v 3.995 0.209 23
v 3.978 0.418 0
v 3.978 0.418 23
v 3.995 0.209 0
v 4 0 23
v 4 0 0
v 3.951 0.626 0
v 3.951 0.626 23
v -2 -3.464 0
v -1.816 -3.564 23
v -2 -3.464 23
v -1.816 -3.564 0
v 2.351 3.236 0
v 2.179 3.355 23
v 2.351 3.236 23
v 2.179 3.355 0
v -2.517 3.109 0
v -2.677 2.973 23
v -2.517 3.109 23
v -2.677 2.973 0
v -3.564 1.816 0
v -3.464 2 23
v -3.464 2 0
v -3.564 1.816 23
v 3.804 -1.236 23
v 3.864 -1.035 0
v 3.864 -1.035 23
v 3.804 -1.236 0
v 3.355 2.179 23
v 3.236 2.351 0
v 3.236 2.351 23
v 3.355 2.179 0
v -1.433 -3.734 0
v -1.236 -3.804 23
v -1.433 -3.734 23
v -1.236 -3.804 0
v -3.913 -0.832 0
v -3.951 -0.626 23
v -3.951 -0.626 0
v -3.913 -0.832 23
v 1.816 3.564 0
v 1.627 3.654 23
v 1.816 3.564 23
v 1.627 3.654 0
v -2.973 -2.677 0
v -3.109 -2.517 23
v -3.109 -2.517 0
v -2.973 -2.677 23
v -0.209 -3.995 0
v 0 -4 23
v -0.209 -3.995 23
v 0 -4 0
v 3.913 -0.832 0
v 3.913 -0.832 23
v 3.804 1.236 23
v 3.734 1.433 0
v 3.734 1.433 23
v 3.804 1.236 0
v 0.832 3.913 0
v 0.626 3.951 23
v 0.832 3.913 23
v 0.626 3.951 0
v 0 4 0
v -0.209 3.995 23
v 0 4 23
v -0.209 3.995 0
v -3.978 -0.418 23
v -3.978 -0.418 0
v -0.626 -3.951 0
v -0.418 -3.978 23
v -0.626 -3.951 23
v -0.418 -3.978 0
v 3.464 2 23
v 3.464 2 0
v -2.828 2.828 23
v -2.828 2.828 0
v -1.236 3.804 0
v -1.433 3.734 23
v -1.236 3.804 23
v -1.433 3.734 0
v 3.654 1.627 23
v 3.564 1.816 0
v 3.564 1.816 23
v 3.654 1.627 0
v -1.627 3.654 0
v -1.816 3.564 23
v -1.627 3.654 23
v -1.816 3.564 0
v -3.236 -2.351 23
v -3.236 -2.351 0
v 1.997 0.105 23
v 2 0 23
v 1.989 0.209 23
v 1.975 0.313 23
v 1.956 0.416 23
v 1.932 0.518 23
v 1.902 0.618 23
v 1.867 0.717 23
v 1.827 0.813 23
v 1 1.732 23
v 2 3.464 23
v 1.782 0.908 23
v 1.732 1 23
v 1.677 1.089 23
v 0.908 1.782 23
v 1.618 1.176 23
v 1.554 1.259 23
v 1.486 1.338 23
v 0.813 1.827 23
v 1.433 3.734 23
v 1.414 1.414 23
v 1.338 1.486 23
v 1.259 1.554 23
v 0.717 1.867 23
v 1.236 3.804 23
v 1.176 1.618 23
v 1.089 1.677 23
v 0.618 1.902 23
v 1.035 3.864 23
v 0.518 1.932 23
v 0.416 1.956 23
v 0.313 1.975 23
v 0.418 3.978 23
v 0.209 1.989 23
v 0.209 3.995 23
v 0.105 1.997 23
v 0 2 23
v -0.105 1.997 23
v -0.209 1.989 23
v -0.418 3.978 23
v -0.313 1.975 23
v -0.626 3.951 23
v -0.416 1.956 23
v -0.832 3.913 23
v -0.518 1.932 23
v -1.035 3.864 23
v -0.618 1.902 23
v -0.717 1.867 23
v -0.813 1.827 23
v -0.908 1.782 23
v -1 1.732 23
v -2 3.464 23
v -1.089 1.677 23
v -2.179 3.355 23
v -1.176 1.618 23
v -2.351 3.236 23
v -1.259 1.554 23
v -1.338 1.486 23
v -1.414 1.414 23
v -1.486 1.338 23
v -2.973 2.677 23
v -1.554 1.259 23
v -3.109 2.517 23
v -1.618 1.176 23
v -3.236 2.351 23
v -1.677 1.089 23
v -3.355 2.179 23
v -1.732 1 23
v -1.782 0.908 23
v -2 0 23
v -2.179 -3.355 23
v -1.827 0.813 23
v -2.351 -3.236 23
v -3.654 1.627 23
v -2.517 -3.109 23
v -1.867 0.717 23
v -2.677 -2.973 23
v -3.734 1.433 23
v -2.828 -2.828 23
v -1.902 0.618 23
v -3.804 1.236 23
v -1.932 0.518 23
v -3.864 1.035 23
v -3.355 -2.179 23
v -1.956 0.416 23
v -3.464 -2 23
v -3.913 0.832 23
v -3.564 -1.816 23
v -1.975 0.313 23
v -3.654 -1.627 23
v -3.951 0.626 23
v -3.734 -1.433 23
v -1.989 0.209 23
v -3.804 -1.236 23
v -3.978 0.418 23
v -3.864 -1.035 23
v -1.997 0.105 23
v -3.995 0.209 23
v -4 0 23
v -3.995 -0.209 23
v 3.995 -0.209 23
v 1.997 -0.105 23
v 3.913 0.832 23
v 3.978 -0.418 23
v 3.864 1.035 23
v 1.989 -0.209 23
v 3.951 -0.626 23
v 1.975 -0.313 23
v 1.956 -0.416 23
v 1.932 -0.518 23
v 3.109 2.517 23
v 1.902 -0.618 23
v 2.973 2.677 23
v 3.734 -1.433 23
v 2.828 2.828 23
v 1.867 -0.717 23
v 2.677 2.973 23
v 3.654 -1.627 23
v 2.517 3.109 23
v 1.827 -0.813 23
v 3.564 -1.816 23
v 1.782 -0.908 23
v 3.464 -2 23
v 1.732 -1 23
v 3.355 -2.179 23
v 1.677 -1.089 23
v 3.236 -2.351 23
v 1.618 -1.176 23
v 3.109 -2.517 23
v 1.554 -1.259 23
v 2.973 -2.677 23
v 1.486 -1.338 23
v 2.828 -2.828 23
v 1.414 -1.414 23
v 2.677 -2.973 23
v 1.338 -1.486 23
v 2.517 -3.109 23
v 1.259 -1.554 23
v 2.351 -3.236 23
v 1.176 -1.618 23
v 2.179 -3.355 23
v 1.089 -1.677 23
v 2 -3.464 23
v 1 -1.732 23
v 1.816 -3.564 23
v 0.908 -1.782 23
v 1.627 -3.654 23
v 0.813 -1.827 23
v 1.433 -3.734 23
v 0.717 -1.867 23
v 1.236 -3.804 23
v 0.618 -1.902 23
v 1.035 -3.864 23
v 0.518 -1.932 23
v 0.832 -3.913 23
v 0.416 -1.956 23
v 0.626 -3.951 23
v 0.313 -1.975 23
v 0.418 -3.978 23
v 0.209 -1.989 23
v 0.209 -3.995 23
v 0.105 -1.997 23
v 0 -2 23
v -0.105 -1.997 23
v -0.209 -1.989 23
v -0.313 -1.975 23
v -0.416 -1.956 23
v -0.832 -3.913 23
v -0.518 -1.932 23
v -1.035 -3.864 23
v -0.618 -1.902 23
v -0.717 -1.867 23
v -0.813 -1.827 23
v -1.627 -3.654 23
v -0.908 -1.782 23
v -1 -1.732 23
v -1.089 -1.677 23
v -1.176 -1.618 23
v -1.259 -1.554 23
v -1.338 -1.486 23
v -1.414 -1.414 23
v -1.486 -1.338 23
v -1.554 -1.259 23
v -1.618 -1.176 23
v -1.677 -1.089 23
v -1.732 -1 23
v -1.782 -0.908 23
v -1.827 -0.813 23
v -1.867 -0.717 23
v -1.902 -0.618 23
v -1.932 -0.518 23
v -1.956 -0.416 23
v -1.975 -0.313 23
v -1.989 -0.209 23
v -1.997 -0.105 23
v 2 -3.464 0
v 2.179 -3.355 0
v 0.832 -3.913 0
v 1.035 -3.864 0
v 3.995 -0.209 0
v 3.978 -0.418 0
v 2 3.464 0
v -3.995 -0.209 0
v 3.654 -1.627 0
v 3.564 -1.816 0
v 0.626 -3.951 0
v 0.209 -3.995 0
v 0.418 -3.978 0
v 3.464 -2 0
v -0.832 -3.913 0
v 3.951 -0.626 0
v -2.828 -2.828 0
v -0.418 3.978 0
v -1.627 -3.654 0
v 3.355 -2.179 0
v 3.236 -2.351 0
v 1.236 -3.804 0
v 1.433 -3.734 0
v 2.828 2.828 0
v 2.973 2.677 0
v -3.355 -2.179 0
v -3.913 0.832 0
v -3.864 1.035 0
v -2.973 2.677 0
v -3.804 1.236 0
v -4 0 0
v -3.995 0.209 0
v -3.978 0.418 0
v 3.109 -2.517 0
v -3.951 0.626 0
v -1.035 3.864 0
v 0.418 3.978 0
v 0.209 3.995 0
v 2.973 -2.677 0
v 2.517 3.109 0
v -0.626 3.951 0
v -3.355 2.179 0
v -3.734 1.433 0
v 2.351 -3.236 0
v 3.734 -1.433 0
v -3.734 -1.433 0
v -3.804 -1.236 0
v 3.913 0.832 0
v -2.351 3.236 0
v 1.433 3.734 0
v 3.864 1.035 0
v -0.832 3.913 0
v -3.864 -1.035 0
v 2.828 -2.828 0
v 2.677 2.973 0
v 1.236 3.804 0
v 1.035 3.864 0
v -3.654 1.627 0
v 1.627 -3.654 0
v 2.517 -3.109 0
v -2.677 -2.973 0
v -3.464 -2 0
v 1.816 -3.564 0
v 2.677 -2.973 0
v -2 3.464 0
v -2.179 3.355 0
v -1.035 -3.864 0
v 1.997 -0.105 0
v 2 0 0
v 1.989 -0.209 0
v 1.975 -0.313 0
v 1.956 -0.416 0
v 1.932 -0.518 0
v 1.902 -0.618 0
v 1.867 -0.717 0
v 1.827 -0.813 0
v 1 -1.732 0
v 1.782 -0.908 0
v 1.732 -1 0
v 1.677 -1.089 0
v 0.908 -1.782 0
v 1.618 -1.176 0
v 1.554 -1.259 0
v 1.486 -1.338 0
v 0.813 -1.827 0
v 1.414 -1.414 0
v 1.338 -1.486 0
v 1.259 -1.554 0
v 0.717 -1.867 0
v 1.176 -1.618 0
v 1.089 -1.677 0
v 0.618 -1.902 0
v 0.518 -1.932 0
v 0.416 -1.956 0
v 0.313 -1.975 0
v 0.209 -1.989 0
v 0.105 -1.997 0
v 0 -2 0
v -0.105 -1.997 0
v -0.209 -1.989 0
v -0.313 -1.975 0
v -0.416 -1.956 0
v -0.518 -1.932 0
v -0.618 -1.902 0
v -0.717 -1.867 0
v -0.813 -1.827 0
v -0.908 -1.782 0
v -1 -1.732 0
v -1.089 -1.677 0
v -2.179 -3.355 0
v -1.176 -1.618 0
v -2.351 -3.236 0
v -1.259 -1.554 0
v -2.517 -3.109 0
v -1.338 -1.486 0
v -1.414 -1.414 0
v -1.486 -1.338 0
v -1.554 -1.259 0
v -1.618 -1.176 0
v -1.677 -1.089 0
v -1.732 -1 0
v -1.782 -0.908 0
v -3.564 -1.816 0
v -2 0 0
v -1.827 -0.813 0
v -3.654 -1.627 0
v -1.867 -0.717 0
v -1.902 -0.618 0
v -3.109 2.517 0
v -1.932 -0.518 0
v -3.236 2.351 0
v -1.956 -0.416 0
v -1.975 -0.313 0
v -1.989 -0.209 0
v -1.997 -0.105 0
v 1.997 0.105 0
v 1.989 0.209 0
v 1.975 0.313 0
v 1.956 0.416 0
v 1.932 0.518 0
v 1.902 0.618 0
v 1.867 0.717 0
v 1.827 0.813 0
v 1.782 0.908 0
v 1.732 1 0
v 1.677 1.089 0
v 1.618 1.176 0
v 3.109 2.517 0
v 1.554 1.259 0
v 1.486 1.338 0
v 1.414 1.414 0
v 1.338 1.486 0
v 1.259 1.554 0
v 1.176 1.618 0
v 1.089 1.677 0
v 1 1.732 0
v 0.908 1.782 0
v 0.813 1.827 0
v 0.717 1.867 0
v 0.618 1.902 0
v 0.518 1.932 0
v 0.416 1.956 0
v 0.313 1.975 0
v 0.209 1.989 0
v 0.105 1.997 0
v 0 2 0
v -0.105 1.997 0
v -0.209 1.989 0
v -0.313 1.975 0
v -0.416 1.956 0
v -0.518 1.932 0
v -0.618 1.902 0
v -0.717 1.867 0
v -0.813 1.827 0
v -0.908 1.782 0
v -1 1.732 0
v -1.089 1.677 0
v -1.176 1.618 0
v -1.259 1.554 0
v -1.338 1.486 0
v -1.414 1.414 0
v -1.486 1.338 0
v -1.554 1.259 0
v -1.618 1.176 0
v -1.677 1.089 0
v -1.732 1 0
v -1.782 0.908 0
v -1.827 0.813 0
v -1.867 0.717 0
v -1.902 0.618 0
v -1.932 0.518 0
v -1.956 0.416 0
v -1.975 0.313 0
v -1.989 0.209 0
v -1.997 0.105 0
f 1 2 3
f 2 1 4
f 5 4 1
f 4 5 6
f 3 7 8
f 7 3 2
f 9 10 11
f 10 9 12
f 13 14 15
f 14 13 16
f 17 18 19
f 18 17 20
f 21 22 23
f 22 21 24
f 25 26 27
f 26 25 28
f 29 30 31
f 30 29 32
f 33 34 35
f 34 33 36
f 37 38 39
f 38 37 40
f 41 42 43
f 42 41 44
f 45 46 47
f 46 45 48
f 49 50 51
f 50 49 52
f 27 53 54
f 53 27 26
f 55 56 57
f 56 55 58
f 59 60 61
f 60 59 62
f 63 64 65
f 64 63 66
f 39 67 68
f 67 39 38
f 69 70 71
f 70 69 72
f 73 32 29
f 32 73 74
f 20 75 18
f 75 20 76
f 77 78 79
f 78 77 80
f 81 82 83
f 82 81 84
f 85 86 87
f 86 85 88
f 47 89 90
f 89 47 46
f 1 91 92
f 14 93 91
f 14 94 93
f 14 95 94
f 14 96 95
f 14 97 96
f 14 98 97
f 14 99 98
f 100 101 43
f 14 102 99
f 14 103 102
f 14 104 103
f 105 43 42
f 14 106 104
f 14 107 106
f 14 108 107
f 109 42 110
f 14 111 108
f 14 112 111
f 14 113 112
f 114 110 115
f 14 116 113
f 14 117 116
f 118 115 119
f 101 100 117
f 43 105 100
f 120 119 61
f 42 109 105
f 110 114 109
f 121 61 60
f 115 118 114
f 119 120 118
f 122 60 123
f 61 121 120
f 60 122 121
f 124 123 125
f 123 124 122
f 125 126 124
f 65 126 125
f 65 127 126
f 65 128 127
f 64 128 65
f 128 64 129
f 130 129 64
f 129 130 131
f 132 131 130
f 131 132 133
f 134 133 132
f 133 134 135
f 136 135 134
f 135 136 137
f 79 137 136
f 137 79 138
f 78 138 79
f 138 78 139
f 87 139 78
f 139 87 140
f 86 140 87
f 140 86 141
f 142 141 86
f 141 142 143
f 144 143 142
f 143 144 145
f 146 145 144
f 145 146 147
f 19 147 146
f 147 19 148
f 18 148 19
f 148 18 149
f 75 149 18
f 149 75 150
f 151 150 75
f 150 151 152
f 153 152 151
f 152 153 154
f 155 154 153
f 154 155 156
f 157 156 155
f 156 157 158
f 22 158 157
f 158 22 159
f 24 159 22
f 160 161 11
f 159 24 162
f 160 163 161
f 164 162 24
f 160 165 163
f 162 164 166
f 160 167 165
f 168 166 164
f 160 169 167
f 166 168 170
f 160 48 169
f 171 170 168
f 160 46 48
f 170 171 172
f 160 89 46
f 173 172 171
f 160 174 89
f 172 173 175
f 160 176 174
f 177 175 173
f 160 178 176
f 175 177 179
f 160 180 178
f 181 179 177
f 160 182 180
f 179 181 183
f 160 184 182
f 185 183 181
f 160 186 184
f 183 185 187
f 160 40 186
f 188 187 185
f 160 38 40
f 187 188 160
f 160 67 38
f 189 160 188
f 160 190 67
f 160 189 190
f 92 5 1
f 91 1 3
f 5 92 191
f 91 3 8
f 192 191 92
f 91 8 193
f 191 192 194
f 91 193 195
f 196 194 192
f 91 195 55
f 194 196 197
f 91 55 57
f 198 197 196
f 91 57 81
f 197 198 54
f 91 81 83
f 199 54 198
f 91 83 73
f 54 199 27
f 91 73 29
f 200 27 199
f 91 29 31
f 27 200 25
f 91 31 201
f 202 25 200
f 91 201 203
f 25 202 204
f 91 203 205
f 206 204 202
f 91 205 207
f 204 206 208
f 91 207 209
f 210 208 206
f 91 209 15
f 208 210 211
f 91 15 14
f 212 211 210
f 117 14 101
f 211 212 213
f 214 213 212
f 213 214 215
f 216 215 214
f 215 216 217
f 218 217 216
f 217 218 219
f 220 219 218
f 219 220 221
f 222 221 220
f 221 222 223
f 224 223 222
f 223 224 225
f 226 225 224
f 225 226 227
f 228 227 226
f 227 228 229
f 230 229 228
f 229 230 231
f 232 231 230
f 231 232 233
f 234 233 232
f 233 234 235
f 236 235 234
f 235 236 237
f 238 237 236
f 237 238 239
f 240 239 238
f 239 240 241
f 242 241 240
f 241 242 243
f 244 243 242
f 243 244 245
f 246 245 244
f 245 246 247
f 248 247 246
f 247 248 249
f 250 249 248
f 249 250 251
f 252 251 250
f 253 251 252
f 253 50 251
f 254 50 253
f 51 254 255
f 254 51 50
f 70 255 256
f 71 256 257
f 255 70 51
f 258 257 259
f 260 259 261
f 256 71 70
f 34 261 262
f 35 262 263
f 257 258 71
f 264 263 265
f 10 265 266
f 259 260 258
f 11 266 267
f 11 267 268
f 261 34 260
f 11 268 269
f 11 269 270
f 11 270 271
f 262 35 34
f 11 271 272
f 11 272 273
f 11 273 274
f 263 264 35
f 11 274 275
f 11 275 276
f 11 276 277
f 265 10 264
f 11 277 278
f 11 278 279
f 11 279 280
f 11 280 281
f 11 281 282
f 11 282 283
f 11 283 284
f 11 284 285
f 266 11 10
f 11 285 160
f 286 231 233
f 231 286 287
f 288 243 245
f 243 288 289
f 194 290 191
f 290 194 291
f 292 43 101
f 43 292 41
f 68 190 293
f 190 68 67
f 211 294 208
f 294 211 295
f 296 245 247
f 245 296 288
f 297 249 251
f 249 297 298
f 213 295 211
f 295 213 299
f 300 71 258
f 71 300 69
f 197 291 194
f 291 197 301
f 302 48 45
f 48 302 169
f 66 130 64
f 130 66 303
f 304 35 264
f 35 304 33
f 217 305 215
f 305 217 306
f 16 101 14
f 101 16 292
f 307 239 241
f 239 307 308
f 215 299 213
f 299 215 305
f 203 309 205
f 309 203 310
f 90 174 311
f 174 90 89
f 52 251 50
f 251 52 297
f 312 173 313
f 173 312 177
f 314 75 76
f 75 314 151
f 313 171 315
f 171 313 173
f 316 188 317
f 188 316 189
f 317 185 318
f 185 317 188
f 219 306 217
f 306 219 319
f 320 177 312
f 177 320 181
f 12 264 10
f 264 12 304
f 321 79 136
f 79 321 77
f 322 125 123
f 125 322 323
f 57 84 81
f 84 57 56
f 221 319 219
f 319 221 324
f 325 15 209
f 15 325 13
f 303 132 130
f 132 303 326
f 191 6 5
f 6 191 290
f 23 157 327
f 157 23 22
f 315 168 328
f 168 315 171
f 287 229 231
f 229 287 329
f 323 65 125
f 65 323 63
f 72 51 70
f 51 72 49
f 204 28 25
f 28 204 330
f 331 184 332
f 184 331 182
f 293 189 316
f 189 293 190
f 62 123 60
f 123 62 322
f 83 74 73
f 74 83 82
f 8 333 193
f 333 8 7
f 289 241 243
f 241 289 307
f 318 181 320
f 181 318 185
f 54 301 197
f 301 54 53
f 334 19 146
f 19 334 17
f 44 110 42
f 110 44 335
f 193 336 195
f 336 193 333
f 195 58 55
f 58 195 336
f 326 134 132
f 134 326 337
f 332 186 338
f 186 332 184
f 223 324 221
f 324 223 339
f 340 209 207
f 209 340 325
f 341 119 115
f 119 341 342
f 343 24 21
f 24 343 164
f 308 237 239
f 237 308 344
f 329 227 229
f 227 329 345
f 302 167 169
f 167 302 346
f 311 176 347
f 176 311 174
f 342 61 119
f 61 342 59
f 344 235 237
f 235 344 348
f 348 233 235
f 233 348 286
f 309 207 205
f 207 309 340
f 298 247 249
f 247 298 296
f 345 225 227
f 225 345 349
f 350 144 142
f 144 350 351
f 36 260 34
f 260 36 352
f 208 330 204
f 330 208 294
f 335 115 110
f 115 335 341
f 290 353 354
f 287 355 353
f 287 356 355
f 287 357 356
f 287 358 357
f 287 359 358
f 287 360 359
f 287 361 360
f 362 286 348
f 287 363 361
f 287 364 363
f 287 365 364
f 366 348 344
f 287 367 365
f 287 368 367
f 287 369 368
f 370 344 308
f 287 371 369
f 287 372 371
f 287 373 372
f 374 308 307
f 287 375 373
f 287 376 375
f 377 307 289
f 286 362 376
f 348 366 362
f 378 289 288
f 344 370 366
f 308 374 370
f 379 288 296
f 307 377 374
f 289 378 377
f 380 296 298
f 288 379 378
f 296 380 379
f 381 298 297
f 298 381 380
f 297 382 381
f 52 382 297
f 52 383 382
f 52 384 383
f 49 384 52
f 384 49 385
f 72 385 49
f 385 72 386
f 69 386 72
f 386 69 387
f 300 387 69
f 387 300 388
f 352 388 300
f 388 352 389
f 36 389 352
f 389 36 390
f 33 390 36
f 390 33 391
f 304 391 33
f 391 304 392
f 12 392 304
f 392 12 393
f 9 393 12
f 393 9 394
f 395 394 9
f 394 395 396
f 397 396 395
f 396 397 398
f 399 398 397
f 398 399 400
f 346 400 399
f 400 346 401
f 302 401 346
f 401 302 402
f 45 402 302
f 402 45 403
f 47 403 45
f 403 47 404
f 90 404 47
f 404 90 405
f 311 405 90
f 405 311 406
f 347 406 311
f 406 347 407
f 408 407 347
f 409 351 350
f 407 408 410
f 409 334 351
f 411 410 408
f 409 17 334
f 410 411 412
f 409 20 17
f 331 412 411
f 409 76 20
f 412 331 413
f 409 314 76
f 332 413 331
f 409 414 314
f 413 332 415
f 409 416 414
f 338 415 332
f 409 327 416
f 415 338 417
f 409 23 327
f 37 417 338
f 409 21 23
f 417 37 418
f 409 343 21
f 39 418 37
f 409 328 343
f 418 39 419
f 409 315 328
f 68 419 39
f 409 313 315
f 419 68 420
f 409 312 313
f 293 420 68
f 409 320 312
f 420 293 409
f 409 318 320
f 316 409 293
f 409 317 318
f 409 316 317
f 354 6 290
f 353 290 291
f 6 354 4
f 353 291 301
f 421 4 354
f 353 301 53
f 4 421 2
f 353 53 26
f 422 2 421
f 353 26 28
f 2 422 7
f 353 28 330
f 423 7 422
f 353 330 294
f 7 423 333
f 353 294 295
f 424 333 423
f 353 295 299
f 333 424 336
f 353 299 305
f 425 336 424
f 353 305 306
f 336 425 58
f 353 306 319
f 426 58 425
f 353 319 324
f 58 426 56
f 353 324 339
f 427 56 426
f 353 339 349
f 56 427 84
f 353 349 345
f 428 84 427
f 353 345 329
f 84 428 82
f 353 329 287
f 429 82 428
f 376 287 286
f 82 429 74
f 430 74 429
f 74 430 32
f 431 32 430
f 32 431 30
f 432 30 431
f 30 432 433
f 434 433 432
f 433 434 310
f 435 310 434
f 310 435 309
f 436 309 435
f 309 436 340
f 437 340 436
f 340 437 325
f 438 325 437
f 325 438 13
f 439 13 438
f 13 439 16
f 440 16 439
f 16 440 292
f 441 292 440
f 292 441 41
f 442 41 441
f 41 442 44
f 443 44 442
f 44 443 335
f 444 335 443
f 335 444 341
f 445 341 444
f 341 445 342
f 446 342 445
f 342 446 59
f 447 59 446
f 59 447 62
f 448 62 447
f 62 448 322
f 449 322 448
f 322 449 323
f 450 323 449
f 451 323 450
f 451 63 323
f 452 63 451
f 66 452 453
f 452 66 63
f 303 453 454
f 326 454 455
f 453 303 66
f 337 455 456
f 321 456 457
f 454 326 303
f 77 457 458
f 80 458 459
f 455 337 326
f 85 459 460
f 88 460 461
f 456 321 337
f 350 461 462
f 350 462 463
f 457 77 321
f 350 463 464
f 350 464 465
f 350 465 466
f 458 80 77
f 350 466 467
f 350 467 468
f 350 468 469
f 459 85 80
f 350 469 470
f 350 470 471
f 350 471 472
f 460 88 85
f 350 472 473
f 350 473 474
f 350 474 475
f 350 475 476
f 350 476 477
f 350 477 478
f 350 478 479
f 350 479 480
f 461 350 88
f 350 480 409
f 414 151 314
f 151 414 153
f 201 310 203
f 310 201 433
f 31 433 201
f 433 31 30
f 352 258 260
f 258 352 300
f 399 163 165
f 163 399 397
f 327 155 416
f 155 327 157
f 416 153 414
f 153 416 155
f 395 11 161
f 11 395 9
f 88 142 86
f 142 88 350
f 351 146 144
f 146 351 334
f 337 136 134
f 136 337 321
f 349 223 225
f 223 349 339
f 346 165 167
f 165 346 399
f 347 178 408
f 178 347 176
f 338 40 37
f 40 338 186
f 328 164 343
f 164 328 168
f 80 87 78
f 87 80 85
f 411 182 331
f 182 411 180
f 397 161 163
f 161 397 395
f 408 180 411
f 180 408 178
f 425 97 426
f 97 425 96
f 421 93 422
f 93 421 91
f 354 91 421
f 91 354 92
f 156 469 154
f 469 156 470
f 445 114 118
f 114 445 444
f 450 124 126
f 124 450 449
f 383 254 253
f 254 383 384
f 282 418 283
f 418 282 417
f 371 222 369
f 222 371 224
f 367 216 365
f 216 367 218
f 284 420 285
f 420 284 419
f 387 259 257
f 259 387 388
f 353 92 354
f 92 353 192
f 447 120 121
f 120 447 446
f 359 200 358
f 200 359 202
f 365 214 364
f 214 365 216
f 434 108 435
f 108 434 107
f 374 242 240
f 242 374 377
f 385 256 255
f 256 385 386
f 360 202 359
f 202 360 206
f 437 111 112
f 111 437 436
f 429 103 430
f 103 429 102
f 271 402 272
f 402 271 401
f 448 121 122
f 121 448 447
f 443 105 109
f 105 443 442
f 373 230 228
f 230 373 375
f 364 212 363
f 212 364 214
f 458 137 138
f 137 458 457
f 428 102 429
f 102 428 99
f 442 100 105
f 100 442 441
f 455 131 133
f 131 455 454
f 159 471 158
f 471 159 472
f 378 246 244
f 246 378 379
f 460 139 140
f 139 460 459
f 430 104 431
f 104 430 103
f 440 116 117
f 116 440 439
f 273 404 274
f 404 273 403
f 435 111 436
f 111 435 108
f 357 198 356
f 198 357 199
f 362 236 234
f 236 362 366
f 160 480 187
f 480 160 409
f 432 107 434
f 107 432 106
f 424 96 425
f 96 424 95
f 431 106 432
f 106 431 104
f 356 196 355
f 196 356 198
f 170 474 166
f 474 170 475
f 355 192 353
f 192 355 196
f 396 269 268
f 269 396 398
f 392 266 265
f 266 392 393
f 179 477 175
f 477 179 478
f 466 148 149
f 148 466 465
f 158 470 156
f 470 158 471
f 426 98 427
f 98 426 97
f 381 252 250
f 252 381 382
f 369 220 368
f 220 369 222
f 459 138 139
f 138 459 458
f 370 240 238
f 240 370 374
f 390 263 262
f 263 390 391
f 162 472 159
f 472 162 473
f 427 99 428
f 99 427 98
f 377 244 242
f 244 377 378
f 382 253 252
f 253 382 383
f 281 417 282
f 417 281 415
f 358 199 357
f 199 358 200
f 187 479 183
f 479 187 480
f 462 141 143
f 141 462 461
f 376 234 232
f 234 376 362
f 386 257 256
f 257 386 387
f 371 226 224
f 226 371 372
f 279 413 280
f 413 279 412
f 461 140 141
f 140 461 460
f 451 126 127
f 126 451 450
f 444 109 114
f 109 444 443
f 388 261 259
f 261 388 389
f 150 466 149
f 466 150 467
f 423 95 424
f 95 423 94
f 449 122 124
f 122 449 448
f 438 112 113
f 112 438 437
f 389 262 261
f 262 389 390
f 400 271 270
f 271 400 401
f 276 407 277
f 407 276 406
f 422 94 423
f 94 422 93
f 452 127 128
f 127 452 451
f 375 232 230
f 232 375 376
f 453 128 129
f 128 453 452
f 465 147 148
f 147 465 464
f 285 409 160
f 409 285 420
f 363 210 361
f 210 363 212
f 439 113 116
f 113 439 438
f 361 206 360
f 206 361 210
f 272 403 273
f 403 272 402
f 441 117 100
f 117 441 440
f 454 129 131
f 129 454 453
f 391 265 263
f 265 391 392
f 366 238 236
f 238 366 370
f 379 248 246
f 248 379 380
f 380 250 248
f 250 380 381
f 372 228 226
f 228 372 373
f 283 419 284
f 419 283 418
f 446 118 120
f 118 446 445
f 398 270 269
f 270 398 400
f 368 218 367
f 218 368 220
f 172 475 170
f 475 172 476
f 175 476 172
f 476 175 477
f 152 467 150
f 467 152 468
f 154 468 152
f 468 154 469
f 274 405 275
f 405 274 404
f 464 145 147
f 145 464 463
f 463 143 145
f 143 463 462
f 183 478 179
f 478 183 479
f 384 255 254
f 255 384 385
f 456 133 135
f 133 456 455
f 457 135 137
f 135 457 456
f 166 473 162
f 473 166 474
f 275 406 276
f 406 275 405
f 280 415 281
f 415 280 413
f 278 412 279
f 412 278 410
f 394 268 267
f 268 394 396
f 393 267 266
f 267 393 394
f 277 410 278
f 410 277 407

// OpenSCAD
// Long linear bearing: 4.0mm bore, 8.0mm OD, 23.0mm length
$fn = 120;

id = 4.0;
od = 8.0;
len = 23.0;

// Small extra length to guarantee a clean through-bore
eps = 0.2;

module linear_bearing(id=4.0, od=8.0, len=23.0) {
    difference() {
        // Outer body (simple cylinder, no lips/grooves)
        cylinder(h=len, d=od, center=false);

        // Through-bore (extends slightly beyond both ends)
        translate([0, 0, -eps])
            cylinder(h=len + 2*eps, d=id, center=false);
    }
}

linear_bearing(id=id, od=od, len=len);
